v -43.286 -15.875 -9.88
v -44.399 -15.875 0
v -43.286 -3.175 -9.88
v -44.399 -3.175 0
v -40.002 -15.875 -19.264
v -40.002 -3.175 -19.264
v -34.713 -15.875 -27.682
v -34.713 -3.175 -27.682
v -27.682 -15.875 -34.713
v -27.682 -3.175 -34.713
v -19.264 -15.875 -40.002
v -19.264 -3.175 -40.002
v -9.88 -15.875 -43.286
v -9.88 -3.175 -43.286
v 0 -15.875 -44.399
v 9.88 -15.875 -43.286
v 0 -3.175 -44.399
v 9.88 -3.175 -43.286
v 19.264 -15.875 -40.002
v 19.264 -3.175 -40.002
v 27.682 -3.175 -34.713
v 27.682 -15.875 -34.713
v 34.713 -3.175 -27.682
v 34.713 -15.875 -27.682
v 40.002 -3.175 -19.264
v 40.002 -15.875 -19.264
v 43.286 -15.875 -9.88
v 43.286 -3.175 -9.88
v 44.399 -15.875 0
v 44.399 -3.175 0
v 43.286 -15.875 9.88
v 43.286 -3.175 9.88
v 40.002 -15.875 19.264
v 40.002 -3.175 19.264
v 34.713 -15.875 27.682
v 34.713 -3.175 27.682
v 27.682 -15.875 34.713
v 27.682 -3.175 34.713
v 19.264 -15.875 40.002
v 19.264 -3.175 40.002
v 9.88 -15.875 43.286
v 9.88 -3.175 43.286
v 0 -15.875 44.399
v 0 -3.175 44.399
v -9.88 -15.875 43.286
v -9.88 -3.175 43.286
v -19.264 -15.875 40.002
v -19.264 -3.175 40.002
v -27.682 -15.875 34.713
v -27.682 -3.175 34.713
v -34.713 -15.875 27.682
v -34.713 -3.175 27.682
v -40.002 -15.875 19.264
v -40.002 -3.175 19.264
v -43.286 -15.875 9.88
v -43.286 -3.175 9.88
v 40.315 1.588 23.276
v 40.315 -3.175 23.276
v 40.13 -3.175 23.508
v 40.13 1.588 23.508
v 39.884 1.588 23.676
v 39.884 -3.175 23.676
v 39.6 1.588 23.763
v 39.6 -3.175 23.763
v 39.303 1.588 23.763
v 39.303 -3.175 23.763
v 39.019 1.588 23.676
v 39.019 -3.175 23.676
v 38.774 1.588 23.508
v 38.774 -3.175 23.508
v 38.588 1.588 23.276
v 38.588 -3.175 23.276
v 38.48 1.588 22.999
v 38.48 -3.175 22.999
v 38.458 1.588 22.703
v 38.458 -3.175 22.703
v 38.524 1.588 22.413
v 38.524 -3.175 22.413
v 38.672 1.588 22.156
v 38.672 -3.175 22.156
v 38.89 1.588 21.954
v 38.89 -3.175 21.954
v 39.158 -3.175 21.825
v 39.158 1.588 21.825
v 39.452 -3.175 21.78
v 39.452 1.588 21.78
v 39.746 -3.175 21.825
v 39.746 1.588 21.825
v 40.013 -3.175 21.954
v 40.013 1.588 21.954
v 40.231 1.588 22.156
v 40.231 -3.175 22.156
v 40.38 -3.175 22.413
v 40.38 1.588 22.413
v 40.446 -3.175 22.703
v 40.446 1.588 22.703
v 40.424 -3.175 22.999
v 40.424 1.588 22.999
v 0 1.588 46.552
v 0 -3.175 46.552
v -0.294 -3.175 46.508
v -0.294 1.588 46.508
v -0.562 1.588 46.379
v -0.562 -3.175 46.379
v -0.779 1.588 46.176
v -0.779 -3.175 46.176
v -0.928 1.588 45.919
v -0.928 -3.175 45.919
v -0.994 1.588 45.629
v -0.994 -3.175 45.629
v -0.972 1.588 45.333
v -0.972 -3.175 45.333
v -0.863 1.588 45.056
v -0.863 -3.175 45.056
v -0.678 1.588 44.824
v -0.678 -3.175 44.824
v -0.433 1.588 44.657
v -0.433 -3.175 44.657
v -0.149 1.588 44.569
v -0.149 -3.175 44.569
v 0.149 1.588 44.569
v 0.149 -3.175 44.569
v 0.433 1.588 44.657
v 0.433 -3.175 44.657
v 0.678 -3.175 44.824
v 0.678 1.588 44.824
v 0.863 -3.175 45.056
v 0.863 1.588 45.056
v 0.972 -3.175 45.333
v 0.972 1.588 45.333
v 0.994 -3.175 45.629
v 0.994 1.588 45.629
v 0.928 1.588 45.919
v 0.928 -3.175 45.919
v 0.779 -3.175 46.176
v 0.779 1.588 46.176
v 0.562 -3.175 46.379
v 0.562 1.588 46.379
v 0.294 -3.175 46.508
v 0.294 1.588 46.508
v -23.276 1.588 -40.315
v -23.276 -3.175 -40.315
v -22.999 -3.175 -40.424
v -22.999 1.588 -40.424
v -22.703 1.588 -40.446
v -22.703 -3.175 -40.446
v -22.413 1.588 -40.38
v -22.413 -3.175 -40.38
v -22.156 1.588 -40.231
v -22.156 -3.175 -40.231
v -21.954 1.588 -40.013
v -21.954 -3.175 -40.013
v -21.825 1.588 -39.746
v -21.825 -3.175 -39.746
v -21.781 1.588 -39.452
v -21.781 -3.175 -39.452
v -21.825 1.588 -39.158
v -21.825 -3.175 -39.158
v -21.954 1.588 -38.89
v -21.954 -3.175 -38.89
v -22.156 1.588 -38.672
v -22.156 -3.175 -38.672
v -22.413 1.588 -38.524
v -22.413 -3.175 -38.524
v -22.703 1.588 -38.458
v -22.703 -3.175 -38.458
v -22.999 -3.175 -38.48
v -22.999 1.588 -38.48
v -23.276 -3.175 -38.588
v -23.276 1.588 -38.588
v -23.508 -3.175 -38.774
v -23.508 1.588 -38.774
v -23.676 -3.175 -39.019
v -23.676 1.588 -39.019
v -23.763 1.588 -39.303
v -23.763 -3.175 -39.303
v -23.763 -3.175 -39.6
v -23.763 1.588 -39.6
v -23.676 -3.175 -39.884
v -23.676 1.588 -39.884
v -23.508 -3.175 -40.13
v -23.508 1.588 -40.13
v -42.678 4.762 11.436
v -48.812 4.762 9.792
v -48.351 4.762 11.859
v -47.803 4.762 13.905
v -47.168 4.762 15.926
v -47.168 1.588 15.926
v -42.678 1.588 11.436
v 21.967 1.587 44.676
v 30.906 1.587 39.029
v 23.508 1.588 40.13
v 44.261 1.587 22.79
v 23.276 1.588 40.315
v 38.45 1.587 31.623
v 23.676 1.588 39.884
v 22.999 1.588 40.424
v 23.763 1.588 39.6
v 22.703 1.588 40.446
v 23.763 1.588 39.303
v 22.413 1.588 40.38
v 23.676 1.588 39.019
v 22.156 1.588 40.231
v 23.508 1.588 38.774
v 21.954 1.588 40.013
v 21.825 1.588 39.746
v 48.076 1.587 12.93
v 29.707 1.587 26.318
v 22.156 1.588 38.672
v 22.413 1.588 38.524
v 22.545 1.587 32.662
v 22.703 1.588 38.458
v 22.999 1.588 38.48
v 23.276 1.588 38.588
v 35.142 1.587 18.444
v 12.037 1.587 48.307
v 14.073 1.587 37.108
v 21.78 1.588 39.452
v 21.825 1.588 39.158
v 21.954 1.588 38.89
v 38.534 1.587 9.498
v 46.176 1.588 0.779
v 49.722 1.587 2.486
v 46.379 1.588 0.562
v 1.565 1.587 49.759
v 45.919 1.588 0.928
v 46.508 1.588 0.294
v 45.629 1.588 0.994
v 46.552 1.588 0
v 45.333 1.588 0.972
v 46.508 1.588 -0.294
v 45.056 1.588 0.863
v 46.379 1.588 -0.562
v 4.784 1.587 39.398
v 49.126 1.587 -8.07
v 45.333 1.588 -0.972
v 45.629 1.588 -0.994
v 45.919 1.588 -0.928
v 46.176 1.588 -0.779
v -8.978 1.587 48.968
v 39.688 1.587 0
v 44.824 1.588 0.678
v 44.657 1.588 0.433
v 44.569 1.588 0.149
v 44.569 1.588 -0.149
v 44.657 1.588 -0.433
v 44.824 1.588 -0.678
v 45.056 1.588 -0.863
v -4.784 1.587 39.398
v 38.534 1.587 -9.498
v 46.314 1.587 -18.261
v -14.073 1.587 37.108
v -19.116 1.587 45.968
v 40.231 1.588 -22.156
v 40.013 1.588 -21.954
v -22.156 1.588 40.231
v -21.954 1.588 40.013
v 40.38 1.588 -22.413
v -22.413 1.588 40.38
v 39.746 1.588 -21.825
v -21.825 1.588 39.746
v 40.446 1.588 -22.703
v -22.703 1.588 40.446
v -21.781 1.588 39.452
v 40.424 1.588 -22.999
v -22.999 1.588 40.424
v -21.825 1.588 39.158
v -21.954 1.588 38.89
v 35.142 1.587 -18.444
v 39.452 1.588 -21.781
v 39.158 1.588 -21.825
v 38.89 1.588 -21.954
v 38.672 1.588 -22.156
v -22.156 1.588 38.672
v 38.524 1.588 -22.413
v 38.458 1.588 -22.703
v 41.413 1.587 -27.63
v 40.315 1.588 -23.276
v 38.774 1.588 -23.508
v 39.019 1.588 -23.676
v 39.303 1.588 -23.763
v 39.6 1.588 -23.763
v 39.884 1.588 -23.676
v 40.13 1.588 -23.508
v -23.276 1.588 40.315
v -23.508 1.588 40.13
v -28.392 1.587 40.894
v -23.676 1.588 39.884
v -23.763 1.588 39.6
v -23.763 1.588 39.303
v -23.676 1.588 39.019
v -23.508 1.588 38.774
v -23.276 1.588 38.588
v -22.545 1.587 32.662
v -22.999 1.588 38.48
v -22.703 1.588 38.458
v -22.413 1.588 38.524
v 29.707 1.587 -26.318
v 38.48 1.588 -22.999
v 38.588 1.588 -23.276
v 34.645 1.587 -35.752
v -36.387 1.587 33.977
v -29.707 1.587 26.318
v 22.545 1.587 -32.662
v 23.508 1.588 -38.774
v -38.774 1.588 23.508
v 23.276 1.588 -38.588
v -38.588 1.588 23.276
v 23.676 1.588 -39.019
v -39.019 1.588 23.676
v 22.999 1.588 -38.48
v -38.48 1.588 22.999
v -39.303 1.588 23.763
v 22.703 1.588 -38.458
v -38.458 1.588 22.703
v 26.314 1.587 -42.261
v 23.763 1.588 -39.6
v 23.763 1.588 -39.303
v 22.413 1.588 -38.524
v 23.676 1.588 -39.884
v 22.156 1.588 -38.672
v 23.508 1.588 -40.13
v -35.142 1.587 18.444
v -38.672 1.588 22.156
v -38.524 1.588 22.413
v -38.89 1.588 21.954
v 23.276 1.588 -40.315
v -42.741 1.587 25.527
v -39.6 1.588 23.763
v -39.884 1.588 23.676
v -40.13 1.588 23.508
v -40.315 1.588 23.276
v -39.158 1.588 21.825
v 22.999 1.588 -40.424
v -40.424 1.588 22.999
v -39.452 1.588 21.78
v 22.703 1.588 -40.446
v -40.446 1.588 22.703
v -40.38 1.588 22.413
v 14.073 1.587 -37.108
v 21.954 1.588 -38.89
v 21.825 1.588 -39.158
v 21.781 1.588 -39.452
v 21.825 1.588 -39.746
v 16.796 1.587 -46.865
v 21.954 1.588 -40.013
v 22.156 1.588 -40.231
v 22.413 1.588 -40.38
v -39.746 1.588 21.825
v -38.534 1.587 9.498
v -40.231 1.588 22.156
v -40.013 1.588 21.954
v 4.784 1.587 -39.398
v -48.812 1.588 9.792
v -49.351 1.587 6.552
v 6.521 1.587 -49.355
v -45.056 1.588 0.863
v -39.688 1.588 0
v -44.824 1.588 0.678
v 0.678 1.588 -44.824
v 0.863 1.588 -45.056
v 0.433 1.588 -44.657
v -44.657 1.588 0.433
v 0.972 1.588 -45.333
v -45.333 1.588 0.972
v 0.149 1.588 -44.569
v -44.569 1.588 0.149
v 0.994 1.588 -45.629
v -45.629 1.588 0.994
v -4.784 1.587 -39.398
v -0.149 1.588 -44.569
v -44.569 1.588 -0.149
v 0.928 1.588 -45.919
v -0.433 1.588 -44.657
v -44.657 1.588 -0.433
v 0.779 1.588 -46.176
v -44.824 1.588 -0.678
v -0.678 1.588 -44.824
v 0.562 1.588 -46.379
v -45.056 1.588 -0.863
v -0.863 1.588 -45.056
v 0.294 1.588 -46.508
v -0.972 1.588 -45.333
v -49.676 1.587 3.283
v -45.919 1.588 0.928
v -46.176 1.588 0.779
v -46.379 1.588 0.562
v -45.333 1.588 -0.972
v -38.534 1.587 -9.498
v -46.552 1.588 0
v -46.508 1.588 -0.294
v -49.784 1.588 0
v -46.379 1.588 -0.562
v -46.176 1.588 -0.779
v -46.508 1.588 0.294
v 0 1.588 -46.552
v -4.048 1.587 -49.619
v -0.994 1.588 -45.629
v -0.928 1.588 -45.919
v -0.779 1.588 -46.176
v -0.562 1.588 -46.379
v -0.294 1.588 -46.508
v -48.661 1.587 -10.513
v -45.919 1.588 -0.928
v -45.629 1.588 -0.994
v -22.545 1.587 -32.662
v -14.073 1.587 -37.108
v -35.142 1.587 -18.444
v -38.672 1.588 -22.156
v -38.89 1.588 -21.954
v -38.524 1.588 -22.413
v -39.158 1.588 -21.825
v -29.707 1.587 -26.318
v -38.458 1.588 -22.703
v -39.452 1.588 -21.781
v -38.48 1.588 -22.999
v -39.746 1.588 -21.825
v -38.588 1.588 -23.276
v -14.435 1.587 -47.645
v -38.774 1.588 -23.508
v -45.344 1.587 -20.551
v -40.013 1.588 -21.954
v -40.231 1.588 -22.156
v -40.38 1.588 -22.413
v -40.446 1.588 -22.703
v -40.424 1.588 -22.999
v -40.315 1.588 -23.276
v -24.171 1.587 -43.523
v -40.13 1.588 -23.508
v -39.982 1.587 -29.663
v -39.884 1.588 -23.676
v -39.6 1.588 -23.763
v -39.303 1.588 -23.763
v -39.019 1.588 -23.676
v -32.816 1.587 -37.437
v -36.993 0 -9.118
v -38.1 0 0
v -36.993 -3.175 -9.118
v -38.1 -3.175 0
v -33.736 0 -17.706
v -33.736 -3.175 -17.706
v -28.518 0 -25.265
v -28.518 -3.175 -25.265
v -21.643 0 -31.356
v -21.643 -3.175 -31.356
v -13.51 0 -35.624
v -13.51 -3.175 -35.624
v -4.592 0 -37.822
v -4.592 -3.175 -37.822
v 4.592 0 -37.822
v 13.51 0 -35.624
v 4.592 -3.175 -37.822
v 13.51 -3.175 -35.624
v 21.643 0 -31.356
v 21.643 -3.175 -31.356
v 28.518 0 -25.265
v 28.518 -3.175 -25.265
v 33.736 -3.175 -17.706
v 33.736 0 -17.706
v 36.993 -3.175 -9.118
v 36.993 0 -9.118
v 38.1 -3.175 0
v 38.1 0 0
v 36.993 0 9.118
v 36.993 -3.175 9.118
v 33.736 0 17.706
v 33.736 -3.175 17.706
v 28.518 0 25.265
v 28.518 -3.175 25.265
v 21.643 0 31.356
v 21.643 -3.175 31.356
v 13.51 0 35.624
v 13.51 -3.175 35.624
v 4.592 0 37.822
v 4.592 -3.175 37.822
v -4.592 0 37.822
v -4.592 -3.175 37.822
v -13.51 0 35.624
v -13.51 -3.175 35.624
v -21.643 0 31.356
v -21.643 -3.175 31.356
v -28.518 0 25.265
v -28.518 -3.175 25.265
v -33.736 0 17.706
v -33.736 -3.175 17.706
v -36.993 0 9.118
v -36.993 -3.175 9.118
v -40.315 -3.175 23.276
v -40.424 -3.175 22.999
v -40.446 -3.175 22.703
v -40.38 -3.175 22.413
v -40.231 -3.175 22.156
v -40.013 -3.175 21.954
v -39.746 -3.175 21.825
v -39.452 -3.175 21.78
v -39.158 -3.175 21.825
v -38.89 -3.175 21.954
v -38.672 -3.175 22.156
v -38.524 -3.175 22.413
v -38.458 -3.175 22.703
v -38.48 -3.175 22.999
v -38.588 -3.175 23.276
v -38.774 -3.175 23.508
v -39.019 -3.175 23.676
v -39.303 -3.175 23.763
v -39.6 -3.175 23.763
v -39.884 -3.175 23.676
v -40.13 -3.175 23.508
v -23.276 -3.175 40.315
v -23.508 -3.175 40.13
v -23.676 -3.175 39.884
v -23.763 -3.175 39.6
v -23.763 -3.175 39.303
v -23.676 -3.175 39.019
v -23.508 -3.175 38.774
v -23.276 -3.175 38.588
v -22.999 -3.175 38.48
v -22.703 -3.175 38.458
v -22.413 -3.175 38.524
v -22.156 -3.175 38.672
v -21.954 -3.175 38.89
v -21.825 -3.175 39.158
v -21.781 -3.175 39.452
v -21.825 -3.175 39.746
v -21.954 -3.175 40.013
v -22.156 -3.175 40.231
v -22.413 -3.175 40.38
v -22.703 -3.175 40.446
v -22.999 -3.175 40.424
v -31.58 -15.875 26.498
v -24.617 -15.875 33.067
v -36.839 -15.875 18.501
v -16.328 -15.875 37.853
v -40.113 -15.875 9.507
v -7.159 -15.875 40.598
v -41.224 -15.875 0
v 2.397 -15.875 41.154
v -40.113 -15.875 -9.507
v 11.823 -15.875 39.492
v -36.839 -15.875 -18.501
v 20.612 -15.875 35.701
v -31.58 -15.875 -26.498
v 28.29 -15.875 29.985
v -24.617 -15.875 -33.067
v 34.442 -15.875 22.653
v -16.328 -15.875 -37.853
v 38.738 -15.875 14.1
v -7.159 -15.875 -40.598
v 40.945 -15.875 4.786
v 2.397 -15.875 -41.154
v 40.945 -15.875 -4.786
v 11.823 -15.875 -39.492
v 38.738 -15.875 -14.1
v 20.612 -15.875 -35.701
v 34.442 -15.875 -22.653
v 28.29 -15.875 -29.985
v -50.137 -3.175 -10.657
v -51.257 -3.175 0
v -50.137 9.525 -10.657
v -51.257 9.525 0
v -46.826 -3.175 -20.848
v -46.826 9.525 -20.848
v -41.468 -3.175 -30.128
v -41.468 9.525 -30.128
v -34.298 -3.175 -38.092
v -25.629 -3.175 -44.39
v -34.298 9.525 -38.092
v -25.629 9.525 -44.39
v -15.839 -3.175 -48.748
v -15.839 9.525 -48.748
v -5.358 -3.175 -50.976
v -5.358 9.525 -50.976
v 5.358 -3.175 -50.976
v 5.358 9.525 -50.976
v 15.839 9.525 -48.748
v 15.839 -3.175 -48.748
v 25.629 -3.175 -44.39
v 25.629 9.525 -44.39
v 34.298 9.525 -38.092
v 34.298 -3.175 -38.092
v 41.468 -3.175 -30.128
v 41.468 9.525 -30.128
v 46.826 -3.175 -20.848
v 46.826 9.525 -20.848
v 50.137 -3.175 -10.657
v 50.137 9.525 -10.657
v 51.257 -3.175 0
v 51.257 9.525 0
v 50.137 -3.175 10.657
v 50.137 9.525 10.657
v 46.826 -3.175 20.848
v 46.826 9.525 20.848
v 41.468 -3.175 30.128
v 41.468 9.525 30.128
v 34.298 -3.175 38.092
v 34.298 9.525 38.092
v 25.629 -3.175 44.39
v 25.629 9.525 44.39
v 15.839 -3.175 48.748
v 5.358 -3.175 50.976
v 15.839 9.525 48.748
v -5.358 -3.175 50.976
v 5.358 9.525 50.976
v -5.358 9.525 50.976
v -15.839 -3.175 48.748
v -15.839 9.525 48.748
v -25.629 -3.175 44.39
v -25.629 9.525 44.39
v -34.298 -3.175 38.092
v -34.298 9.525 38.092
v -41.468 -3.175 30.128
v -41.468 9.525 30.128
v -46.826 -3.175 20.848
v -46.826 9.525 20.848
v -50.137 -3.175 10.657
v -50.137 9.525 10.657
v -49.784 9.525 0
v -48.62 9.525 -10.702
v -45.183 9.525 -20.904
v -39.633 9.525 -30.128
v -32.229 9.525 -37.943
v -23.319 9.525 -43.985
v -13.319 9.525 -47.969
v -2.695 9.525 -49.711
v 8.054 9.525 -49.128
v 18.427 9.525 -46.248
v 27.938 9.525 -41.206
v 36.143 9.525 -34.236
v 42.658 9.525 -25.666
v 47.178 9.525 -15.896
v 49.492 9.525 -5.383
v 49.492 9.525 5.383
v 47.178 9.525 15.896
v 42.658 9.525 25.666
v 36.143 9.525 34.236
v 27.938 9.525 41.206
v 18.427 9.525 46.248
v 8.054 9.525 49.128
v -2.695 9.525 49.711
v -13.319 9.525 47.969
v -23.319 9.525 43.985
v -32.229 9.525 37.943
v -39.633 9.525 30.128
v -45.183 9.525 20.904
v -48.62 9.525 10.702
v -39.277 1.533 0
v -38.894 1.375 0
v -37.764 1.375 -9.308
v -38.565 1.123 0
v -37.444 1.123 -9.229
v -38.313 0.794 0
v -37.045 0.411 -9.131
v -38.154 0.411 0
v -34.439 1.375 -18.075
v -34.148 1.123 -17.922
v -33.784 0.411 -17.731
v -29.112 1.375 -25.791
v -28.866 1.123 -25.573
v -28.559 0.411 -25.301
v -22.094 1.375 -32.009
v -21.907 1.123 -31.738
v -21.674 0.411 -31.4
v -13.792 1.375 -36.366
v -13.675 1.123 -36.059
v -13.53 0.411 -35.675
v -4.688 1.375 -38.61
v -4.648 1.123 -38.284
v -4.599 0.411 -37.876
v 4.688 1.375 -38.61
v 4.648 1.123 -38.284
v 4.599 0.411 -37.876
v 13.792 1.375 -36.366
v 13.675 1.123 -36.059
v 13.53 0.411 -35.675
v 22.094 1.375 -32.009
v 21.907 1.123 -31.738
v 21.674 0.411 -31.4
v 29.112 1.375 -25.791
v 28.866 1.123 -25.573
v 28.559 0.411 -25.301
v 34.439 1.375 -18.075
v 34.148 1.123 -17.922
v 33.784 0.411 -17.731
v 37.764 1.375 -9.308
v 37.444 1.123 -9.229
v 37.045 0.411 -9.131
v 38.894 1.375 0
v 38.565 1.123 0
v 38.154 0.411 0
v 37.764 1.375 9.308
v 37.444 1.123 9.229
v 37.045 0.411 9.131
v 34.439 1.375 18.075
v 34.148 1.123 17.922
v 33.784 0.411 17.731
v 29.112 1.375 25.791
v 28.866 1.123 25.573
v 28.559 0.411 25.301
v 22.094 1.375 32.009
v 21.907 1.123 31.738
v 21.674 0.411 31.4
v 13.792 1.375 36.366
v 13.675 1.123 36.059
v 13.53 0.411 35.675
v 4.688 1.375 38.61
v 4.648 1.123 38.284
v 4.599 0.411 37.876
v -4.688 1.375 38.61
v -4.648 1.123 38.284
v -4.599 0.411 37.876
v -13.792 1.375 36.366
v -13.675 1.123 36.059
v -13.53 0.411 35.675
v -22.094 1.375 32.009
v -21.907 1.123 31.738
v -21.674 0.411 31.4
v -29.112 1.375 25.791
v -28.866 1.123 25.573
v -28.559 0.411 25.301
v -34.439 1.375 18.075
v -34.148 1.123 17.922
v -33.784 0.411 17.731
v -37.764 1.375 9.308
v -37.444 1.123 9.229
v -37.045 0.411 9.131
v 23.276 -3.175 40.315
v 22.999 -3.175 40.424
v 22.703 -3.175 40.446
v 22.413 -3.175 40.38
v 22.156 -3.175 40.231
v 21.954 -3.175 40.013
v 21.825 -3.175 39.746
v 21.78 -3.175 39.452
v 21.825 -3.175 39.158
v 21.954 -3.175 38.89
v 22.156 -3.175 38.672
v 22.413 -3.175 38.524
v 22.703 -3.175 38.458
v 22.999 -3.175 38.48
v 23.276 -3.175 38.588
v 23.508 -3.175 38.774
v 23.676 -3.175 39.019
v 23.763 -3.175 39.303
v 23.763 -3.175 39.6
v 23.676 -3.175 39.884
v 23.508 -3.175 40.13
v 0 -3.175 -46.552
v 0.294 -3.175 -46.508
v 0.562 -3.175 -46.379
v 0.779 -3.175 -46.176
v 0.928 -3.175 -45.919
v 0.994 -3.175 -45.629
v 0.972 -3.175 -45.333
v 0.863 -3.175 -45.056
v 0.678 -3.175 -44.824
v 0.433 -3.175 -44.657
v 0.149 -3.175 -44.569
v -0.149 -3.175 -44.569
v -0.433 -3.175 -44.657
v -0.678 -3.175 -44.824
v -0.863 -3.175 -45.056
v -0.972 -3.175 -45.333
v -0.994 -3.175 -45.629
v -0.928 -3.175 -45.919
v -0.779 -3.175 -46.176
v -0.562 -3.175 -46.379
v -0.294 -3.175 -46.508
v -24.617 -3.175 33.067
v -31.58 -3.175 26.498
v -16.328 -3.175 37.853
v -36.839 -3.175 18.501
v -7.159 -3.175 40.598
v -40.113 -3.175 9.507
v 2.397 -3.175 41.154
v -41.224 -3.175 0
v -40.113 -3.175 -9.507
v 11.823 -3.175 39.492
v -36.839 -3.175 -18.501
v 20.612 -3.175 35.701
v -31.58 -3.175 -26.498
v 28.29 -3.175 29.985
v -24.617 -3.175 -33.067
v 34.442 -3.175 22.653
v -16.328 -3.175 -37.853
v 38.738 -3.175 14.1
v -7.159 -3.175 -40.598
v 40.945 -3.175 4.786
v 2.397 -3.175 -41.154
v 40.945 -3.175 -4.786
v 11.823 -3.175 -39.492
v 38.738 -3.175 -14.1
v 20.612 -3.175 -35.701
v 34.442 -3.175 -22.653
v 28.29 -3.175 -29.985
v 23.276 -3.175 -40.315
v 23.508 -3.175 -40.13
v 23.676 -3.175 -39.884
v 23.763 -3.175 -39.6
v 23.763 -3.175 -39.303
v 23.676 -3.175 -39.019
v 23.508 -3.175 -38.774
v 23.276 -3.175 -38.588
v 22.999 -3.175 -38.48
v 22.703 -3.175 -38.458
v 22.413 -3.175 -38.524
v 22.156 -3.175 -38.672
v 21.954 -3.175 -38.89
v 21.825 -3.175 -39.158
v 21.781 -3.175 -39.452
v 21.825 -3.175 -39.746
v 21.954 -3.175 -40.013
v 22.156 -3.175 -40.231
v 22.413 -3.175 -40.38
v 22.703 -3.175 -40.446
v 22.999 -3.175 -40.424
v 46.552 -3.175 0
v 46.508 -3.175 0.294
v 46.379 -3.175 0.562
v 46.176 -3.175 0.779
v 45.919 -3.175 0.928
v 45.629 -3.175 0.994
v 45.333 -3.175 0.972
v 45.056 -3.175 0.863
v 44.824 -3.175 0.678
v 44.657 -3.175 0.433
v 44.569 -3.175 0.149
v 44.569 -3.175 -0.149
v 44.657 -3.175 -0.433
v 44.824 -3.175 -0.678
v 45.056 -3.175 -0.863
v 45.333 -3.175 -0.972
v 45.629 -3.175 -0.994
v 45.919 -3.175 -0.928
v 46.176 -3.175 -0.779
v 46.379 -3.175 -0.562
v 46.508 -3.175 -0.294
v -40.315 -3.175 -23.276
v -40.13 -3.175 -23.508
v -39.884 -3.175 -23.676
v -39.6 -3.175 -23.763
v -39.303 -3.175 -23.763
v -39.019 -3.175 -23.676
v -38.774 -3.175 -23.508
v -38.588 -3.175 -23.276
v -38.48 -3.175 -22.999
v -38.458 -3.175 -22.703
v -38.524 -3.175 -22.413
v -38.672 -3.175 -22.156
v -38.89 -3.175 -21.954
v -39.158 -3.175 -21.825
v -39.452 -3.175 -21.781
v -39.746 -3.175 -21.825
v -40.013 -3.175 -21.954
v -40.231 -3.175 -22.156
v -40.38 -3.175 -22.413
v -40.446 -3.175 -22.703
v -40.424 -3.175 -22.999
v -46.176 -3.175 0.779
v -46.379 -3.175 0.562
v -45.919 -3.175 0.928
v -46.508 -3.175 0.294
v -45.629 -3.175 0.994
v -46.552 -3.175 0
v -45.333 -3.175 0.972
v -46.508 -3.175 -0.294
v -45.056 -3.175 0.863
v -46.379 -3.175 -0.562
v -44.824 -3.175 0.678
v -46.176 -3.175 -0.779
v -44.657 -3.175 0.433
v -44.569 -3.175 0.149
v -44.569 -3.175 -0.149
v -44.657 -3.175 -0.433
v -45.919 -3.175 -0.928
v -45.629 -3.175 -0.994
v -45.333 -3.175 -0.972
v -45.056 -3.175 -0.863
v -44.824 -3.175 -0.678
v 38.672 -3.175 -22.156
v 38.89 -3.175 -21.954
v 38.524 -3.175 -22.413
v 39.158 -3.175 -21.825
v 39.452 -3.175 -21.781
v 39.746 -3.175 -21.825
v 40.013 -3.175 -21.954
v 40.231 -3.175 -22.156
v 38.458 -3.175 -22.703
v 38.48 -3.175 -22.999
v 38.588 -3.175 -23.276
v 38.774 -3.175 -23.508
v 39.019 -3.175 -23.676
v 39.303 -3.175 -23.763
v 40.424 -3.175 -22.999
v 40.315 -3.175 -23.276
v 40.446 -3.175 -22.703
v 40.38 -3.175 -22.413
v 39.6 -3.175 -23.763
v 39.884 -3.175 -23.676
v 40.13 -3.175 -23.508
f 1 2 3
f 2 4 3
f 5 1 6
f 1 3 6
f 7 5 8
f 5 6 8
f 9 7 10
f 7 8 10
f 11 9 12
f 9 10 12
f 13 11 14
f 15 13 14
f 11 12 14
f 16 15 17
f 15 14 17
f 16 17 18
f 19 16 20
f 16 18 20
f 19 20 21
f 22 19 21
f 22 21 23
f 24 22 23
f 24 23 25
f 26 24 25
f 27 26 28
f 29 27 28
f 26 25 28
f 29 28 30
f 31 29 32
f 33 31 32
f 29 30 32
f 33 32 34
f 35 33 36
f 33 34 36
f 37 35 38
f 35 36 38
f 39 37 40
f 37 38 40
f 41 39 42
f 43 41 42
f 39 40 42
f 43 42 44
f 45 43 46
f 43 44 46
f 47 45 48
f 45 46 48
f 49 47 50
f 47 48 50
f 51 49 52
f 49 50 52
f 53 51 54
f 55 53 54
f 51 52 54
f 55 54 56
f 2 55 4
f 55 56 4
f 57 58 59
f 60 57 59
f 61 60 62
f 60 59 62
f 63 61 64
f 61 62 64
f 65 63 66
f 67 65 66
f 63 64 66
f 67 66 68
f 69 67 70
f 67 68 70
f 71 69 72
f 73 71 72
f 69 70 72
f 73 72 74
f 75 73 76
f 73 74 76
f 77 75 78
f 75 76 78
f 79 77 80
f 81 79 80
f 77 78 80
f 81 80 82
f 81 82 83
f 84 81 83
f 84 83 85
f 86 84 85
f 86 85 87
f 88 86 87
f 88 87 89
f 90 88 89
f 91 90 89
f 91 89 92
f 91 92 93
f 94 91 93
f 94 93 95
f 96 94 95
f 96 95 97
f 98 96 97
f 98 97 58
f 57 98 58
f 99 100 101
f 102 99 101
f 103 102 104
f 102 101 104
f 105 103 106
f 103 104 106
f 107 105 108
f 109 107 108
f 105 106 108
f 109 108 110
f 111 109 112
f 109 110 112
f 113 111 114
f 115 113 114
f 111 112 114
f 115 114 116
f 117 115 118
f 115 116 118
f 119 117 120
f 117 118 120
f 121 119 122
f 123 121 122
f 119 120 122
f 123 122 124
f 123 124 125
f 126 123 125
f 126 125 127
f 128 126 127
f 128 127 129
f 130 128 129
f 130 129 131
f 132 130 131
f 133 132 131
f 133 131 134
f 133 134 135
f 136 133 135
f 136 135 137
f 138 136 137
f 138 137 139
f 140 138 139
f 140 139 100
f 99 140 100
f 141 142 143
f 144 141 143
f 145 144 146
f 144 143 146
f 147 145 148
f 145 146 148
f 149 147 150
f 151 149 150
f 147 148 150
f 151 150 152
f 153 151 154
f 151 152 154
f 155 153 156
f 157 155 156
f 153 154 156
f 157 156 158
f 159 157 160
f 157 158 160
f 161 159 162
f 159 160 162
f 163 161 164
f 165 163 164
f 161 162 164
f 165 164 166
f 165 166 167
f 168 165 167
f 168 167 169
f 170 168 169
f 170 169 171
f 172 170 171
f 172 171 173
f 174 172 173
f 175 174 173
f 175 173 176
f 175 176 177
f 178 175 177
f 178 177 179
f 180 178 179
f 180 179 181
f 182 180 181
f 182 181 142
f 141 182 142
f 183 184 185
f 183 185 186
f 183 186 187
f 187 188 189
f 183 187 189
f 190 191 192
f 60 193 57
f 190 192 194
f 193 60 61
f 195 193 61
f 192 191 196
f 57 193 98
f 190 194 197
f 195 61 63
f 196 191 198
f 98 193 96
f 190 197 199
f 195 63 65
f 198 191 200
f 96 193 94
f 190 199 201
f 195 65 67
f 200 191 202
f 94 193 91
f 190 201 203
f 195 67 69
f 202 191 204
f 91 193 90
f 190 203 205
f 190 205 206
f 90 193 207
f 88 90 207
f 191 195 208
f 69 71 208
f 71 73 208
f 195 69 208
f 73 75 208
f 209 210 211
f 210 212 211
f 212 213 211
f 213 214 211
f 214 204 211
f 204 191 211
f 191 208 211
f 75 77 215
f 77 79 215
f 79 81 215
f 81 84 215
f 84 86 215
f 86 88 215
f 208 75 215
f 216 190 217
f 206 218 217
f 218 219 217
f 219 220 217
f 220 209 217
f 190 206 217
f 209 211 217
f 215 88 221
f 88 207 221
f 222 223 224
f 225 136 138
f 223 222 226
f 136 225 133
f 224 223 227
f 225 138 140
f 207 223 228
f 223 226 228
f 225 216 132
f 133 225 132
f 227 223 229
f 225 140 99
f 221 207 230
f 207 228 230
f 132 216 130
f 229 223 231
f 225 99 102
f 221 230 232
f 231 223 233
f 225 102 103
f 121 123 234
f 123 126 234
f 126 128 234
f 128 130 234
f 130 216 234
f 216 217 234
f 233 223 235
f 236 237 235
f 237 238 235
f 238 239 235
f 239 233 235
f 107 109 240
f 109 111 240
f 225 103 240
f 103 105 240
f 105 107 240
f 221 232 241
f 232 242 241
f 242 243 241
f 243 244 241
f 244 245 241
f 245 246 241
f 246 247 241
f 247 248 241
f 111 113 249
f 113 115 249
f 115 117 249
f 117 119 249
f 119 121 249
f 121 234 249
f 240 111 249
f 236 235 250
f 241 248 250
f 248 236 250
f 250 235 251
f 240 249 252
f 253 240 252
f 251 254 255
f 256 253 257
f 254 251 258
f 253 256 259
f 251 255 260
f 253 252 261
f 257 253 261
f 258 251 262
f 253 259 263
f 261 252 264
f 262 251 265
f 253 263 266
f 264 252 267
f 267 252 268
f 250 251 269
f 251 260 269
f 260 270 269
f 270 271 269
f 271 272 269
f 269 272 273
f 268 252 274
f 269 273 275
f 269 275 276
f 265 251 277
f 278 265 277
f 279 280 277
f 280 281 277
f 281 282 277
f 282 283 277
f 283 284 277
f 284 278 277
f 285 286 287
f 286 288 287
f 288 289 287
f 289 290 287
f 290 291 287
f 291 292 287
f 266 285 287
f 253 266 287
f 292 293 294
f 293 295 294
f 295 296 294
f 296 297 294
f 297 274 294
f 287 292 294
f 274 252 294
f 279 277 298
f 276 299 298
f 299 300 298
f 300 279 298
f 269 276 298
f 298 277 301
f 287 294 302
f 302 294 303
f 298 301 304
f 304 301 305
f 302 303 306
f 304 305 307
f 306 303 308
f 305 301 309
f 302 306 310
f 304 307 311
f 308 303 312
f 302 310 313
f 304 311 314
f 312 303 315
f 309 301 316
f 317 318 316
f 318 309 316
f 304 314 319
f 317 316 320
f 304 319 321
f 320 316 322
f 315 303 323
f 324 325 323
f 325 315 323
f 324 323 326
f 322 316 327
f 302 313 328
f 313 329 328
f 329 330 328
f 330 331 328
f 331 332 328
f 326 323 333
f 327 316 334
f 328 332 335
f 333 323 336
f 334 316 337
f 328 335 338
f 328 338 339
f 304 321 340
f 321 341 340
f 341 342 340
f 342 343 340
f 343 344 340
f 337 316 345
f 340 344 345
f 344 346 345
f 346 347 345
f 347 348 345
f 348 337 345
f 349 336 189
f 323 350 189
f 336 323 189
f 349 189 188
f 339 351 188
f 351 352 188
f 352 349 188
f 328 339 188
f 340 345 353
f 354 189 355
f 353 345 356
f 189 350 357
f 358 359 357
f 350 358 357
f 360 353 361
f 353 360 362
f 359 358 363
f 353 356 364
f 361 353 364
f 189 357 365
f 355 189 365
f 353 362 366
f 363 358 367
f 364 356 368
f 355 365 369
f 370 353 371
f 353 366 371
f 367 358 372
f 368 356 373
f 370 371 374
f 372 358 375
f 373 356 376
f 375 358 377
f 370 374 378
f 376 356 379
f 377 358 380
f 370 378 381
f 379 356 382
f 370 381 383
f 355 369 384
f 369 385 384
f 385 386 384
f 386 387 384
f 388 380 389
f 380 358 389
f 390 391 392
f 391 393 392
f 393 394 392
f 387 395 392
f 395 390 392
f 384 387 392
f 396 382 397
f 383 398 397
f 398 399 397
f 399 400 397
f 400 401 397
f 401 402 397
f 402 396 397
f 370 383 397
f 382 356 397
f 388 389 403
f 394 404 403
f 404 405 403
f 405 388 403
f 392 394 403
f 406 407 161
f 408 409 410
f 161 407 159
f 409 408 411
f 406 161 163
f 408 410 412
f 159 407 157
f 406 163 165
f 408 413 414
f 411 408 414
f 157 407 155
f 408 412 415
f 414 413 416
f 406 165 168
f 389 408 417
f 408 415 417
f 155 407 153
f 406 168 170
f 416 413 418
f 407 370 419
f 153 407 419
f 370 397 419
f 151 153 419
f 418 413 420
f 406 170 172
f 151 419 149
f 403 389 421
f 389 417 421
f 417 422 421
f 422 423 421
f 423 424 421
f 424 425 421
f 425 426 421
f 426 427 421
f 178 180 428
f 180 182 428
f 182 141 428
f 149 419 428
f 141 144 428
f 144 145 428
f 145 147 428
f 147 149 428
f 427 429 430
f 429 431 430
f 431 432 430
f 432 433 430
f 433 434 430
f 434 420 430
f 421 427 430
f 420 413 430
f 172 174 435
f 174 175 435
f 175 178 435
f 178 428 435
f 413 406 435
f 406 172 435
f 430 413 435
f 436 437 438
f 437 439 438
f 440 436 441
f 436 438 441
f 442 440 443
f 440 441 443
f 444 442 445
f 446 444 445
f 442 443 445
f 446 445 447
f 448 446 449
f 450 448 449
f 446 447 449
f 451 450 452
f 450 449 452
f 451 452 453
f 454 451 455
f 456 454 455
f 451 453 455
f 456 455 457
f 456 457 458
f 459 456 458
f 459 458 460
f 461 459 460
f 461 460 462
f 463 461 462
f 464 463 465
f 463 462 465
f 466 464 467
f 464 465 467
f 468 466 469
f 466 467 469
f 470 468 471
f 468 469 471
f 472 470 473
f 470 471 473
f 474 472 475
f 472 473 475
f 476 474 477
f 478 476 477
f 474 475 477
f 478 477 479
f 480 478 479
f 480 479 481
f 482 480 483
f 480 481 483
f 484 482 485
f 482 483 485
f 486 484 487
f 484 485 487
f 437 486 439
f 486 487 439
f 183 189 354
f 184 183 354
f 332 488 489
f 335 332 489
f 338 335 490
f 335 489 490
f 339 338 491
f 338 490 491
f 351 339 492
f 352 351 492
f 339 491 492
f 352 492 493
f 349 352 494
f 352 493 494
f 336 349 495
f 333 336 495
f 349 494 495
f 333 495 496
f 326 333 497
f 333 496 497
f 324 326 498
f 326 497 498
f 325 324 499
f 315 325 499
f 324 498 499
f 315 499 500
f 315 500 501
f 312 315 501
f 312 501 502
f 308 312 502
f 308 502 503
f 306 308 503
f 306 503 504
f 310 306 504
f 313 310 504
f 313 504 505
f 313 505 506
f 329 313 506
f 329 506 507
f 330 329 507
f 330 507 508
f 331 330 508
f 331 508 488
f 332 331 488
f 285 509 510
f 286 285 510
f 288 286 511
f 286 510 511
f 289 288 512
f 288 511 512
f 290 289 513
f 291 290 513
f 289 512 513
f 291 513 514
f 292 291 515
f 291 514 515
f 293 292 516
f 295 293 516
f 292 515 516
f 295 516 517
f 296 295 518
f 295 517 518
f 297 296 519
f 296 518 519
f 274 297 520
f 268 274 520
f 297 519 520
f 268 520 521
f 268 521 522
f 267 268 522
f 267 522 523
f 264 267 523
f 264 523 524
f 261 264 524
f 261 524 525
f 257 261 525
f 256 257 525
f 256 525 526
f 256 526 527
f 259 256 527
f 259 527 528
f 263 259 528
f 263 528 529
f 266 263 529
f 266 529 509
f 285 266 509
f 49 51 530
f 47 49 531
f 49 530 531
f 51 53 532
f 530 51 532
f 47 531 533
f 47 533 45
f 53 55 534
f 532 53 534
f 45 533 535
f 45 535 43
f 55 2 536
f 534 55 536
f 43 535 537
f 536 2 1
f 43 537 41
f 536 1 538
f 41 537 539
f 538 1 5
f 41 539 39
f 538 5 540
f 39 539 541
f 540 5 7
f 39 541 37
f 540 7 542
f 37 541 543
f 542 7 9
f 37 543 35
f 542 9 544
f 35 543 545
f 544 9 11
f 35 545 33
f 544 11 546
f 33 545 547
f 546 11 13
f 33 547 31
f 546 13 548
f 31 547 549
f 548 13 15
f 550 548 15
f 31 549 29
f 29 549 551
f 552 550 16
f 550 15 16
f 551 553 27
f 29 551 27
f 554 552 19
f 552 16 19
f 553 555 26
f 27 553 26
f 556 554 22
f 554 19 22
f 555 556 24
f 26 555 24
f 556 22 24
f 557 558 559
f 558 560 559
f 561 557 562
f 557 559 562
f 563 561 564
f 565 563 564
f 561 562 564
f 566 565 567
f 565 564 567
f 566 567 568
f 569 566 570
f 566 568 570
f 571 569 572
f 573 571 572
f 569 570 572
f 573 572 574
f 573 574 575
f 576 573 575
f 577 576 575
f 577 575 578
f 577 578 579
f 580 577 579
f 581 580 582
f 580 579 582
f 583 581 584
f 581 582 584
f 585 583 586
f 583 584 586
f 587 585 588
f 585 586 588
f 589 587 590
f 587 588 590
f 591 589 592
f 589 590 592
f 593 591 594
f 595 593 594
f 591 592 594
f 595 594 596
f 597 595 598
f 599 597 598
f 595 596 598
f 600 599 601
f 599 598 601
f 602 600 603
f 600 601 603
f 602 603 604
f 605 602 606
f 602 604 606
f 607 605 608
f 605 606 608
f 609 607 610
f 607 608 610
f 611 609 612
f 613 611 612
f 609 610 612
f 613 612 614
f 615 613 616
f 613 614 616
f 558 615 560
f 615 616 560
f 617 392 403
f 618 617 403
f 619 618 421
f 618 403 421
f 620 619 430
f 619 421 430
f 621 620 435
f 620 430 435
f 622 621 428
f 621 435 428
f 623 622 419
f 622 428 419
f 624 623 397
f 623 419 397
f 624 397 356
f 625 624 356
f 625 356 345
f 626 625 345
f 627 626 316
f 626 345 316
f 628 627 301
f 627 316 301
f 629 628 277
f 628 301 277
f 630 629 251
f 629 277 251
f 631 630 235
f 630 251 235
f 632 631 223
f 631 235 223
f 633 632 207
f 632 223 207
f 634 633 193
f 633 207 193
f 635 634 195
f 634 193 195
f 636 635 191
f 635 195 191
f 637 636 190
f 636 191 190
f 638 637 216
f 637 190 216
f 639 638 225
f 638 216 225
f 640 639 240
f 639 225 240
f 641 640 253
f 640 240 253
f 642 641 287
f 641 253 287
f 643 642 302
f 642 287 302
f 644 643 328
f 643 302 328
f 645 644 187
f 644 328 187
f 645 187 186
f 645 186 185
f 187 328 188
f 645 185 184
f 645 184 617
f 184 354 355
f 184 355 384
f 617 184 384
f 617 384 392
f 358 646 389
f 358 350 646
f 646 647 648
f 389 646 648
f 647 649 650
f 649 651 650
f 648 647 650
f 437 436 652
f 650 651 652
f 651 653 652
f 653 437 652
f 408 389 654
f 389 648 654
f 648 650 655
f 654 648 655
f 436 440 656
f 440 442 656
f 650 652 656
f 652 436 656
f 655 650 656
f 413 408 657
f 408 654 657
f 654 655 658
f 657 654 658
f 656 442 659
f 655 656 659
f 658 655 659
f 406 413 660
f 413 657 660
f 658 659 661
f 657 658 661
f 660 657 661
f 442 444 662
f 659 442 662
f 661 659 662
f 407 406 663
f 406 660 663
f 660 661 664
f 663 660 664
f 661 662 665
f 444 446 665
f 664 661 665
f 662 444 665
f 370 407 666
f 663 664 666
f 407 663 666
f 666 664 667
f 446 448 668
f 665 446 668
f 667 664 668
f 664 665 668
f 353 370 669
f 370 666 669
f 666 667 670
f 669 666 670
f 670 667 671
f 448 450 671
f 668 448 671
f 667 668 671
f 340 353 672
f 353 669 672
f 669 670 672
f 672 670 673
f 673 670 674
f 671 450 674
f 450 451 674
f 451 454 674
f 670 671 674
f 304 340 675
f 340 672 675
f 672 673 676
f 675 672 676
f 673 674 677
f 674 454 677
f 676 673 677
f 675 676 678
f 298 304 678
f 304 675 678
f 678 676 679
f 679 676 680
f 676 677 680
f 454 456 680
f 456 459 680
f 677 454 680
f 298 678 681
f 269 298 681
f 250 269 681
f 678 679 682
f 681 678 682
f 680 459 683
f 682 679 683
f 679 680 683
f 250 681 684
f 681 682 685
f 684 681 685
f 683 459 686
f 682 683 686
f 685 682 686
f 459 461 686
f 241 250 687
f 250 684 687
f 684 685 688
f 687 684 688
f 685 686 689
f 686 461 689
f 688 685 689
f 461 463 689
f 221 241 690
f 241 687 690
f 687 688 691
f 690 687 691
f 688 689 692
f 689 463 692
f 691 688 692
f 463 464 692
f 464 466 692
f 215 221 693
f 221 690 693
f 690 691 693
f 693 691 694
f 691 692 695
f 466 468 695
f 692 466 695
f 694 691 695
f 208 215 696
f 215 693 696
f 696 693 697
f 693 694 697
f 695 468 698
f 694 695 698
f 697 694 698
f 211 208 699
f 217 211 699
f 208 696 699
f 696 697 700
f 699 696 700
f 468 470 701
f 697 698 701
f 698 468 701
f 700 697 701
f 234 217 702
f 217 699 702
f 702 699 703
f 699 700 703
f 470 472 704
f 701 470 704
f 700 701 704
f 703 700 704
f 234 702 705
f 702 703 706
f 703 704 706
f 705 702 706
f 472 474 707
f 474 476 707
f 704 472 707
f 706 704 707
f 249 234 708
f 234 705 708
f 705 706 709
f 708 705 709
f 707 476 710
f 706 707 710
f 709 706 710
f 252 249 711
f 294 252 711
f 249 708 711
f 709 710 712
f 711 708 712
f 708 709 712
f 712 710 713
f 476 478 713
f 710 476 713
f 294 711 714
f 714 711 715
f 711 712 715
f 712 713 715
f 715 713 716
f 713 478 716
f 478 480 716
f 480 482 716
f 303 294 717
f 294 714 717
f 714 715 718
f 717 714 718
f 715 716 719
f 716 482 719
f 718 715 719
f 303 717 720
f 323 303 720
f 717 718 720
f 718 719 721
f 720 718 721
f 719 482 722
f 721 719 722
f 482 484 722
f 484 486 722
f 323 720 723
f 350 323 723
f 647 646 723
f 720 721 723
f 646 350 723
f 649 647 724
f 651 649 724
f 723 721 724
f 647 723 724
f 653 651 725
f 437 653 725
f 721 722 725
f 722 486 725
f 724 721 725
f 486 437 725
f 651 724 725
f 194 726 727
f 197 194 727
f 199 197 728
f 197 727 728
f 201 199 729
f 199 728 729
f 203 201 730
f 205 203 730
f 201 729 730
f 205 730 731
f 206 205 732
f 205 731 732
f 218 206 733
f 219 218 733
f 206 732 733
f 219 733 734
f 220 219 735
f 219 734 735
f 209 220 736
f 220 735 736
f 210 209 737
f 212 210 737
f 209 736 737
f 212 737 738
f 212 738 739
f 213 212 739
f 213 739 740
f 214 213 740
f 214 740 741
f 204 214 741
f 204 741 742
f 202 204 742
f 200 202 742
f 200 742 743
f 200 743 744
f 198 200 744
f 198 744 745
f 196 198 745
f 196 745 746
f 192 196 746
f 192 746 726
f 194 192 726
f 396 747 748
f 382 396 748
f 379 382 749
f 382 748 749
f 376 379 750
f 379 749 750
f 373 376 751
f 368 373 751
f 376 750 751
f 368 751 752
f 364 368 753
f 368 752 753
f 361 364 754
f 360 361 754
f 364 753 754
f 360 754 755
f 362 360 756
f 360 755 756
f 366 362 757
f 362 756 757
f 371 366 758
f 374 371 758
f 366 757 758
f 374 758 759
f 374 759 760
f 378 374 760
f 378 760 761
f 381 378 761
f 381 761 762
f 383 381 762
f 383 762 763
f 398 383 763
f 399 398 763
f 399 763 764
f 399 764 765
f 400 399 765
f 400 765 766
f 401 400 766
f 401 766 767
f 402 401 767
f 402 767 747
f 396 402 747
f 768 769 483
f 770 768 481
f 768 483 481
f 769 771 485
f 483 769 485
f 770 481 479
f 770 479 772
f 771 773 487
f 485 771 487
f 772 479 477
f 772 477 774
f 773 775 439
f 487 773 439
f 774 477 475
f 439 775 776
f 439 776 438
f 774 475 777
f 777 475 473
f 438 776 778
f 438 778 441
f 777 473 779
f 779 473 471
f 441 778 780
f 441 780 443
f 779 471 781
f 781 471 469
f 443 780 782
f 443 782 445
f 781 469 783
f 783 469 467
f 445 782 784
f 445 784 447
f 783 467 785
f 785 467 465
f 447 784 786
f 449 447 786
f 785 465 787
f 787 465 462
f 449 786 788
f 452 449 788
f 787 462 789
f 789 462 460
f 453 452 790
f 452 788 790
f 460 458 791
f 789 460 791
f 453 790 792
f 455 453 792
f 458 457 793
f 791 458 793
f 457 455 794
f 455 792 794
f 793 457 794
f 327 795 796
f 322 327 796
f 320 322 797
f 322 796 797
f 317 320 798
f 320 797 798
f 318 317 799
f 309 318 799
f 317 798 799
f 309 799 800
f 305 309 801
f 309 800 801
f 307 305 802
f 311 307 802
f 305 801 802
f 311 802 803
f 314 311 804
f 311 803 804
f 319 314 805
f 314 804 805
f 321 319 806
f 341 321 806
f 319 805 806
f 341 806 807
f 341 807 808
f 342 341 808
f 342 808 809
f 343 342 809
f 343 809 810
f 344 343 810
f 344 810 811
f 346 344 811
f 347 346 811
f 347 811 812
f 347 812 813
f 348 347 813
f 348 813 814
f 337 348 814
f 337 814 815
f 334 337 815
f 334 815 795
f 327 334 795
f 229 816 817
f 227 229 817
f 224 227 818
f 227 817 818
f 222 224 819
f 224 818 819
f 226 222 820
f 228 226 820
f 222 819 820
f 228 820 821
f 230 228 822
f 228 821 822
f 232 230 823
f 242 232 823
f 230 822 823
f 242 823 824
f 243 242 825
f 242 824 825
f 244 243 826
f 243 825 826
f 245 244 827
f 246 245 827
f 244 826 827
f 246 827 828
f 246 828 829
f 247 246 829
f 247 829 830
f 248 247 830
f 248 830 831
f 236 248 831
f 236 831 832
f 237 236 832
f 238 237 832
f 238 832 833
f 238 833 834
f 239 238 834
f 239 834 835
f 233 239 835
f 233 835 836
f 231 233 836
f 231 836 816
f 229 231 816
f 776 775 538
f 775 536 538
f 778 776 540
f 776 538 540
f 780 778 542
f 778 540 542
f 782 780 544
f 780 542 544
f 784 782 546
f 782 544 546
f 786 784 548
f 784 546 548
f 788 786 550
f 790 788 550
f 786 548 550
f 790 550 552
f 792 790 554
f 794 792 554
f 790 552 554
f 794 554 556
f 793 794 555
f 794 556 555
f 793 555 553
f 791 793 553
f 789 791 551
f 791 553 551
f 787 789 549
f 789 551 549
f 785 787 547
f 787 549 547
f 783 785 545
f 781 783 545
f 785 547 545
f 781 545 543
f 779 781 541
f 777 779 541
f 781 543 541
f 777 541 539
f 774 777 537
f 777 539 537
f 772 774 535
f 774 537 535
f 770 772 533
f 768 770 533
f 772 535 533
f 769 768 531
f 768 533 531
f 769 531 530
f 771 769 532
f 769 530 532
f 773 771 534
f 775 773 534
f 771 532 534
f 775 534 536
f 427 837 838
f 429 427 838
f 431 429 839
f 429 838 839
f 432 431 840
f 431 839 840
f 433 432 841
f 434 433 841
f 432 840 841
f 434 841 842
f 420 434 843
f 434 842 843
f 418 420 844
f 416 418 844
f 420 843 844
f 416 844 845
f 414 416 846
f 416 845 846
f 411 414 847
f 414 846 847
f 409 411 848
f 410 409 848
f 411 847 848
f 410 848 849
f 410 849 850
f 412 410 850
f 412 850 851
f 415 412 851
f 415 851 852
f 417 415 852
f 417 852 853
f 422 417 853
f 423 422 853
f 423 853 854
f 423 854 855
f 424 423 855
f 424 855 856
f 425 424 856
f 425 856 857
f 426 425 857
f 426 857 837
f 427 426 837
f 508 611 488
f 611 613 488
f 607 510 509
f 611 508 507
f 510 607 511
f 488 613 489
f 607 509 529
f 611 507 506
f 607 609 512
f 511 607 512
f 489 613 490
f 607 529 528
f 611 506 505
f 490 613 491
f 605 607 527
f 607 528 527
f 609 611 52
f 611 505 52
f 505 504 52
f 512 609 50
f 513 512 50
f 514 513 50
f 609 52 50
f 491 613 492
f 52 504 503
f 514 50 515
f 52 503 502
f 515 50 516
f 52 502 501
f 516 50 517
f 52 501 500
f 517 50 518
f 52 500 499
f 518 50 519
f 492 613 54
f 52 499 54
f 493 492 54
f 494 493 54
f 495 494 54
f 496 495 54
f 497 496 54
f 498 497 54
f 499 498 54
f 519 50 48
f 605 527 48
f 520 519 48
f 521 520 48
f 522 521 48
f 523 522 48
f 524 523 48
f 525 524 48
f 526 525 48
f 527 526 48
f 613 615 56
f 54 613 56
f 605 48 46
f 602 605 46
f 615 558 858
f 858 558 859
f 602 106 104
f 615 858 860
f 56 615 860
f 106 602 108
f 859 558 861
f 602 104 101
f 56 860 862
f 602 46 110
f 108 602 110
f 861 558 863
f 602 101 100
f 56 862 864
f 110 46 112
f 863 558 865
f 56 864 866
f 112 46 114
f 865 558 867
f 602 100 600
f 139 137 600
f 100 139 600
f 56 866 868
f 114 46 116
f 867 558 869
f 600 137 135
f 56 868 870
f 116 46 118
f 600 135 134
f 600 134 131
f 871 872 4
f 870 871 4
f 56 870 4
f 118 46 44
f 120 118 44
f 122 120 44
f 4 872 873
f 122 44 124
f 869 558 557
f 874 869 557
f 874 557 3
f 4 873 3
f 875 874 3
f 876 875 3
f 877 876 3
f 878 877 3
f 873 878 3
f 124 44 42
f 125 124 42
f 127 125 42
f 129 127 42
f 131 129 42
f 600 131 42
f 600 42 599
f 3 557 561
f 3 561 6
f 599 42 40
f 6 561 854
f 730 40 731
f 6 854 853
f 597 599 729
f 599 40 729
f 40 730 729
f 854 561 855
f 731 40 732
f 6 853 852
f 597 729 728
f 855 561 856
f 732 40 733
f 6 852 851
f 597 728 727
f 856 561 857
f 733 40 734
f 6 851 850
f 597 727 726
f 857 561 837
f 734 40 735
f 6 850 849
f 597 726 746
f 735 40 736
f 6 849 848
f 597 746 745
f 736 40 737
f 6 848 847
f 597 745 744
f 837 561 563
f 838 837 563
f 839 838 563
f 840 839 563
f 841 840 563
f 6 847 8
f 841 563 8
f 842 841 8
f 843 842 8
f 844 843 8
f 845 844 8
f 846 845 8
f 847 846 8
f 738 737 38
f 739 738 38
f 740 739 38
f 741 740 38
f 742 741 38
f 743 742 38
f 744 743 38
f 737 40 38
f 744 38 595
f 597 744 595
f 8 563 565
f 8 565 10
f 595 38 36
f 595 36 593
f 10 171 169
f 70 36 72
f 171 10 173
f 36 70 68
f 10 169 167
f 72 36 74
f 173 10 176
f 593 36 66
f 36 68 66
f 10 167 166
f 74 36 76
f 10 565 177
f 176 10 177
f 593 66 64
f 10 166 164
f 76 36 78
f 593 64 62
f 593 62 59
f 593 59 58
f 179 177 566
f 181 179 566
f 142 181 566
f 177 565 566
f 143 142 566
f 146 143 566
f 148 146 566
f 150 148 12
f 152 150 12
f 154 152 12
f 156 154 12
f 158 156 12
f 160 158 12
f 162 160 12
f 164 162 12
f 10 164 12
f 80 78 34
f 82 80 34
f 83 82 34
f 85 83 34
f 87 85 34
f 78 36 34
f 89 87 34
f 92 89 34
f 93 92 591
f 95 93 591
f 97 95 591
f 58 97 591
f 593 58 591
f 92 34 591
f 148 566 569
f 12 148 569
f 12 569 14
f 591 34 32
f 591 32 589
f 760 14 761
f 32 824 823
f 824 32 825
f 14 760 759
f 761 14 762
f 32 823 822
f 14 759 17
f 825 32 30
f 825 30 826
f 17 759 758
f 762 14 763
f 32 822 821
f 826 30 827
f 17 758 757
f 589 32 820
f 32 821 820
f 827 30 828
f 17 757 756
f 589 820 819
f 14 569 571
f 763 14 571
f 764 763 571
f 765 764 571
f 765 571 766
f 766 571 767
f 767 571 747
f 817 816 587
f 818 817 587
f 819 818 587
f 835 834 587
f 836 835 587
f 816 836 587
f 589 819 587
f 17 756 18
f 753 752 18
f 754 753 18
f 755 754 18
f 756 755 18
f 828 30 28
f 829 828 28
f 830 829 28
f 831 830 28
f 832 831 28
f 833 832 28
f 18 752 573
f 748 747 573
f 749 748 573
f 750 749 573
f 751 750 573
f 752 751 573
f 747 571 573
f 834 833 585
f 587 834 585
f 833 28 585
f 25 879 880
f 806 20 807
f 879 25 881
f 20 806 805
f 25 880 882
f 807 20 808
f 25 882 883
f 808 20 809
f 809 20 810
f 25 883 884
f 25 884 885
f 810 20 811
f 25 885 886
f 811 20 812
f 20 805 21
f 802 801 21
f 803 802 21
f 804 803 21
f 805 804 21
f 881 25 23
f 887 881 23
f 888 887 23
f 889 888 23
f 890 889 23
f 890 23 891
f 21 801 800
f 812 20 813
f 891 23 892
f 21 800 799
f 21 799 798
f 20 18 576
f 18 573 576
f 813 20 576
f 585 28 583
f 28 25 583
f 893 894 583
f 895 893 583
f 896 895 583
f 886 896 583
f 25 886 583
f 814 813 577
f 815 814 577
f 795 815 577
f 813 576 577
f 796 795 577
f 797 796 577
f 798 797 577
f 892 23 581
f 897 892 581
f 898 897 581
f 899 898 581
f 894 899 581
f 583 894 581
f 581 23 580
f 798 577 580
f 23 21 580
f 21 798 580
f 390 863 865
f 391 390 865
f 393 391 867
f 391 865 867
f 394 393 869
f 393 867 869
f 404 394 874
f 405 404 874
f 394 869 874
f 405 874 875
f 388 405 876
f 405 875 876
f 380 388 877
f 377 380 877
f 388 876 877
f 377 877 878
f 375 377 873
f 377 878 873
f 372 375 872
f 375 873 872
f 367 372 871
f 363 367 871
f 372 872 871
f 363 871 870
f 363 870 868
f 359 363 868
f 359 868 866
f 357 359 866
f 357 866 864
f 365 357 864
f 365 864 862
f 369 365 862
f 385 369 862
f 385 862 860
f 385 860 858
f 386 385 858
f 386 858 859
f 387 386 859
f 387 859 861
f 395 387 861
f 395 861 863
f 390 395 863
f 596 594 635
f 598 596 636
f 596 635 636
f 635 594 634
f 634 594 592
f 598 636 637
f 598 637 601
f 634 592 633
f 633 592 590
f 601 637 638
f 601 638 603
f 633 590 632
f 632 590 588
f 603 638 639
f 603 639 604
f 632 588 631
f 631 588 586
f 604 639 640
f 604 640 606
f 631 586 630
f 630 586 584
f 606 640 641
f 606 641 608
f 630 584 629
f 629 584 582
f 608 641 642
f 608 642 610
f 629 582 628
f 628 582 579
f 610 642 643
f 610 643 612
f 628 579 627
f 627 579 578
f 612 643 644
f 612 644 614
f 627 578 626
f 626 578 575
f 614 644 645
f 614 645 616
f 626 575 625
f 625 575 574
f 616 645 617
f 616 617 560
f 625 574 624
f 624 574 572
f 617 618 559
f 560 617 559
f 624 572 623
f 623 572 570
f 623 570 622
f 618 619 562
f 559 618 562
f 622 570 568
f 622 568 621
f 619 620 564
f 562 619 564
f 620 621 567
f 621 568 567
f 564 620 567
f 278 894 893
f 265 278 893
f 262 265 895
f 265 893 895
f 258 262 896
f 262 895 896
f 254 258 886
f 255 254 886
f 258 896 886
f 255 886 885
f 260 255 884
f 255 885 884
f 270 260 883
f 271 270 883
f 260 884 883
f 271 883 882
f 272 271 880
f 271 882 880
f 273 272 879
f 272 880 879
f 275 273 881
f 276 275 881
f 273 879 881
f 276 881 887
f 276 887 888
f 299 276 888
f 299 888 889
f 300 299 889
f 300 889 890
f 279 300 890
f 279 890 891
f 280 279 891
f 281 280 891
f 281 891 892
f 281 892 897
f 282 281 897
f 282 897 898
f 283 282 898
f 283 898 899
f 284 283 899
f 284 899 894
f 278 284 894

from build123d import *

# Parameters (mm, degrees)
F_3_48_TAPPED_HOLE1_D = 1.9939
CIRPATTERN1_COUNT     = 12
BOSS_EXTRUDE1_DEPTH   = 3.175


with BuildPart() as part:
    # Cross Section → Main (revolve)
    with BuildSketch(Plane.XY):
        with BuildLine():
            Line((-38.1, 0), (-38.1, -3.175))
            Line((-38.1, -3.175), (-41.2242, -3.175))
            Line((-41.2242, -3.175), (-41.2242, -15.875))
            Line((-41.2242, -15.875), (-44.3992, -15.875))
            Line((-44.3992, -15.875), (-44.3992, -3.175))
            Line((-44.3992, -3.175), (-51.2572, -3.175))
            Line((-51.2572, -3.175), (-51.2572, 9.525))
            Line((-51.2572, 9.525), (-49.784, 9.525))
            Line((-49.784, 9.525), (-49.784, 1.5875))
            Line((-49.784, 1.5875), (-39.6875, 1.5875))
            ThreePointArc((-39.6875, 1.5875), (-38.564967985, 1.122532015), (-38.1, 0))
        make_face()
    revolve(axis=Axis((0, 55, 0), (0, -1, 0)))

    # #3-48 Tapped Hole1 (through all)
    with Locations(Plane(origin=(0, 1.5875, 0), x_dir=(1, 0, 0), z_dir=(0, 1, 0))):
        with Locations((-45.5549, 0)):
            f_3_48_tapped_hole1 = Hole(F_3_48_TAPPED_HOLE1_D / 2)

    # CirPattern1: #3-48 Tapped Hole1 ×12 about axis
    cirpattern1_axis = Axis((0, 0, 0), (0, 1, 0))
    for i in range(1, CIRPATTERN1_COUNT):
        add(f_3_48_tapped_hole1.rotate(cirpattern1_axis, i * 360 / CIRPATTERN1_COUNT), mode=Mode.SUBTRACT)

    # Sketch3 → Boss-Extrude1 (add)
    with BuildSketch(Plane(origin=(0, 1.5875, 0), x_dir=(1, 0, 0), z_dir=(0, 1, 0))):
        with BuildLine():
            Line((-47.168007396, -15.925631363), (-42.677879335, -11.435503303))
            Line((-42.677879335, -11.435503303), (-48.811508332, -9.792002366))
            ThreePointArc((-48.811508332, -9.792002366), (-48.087651336, -12.885047341), (-47.168007396, -15.925631363))
        make_face()
    extrude(amount=BOSS_EXTRUDE1_DEPTH)


solid = part.part
